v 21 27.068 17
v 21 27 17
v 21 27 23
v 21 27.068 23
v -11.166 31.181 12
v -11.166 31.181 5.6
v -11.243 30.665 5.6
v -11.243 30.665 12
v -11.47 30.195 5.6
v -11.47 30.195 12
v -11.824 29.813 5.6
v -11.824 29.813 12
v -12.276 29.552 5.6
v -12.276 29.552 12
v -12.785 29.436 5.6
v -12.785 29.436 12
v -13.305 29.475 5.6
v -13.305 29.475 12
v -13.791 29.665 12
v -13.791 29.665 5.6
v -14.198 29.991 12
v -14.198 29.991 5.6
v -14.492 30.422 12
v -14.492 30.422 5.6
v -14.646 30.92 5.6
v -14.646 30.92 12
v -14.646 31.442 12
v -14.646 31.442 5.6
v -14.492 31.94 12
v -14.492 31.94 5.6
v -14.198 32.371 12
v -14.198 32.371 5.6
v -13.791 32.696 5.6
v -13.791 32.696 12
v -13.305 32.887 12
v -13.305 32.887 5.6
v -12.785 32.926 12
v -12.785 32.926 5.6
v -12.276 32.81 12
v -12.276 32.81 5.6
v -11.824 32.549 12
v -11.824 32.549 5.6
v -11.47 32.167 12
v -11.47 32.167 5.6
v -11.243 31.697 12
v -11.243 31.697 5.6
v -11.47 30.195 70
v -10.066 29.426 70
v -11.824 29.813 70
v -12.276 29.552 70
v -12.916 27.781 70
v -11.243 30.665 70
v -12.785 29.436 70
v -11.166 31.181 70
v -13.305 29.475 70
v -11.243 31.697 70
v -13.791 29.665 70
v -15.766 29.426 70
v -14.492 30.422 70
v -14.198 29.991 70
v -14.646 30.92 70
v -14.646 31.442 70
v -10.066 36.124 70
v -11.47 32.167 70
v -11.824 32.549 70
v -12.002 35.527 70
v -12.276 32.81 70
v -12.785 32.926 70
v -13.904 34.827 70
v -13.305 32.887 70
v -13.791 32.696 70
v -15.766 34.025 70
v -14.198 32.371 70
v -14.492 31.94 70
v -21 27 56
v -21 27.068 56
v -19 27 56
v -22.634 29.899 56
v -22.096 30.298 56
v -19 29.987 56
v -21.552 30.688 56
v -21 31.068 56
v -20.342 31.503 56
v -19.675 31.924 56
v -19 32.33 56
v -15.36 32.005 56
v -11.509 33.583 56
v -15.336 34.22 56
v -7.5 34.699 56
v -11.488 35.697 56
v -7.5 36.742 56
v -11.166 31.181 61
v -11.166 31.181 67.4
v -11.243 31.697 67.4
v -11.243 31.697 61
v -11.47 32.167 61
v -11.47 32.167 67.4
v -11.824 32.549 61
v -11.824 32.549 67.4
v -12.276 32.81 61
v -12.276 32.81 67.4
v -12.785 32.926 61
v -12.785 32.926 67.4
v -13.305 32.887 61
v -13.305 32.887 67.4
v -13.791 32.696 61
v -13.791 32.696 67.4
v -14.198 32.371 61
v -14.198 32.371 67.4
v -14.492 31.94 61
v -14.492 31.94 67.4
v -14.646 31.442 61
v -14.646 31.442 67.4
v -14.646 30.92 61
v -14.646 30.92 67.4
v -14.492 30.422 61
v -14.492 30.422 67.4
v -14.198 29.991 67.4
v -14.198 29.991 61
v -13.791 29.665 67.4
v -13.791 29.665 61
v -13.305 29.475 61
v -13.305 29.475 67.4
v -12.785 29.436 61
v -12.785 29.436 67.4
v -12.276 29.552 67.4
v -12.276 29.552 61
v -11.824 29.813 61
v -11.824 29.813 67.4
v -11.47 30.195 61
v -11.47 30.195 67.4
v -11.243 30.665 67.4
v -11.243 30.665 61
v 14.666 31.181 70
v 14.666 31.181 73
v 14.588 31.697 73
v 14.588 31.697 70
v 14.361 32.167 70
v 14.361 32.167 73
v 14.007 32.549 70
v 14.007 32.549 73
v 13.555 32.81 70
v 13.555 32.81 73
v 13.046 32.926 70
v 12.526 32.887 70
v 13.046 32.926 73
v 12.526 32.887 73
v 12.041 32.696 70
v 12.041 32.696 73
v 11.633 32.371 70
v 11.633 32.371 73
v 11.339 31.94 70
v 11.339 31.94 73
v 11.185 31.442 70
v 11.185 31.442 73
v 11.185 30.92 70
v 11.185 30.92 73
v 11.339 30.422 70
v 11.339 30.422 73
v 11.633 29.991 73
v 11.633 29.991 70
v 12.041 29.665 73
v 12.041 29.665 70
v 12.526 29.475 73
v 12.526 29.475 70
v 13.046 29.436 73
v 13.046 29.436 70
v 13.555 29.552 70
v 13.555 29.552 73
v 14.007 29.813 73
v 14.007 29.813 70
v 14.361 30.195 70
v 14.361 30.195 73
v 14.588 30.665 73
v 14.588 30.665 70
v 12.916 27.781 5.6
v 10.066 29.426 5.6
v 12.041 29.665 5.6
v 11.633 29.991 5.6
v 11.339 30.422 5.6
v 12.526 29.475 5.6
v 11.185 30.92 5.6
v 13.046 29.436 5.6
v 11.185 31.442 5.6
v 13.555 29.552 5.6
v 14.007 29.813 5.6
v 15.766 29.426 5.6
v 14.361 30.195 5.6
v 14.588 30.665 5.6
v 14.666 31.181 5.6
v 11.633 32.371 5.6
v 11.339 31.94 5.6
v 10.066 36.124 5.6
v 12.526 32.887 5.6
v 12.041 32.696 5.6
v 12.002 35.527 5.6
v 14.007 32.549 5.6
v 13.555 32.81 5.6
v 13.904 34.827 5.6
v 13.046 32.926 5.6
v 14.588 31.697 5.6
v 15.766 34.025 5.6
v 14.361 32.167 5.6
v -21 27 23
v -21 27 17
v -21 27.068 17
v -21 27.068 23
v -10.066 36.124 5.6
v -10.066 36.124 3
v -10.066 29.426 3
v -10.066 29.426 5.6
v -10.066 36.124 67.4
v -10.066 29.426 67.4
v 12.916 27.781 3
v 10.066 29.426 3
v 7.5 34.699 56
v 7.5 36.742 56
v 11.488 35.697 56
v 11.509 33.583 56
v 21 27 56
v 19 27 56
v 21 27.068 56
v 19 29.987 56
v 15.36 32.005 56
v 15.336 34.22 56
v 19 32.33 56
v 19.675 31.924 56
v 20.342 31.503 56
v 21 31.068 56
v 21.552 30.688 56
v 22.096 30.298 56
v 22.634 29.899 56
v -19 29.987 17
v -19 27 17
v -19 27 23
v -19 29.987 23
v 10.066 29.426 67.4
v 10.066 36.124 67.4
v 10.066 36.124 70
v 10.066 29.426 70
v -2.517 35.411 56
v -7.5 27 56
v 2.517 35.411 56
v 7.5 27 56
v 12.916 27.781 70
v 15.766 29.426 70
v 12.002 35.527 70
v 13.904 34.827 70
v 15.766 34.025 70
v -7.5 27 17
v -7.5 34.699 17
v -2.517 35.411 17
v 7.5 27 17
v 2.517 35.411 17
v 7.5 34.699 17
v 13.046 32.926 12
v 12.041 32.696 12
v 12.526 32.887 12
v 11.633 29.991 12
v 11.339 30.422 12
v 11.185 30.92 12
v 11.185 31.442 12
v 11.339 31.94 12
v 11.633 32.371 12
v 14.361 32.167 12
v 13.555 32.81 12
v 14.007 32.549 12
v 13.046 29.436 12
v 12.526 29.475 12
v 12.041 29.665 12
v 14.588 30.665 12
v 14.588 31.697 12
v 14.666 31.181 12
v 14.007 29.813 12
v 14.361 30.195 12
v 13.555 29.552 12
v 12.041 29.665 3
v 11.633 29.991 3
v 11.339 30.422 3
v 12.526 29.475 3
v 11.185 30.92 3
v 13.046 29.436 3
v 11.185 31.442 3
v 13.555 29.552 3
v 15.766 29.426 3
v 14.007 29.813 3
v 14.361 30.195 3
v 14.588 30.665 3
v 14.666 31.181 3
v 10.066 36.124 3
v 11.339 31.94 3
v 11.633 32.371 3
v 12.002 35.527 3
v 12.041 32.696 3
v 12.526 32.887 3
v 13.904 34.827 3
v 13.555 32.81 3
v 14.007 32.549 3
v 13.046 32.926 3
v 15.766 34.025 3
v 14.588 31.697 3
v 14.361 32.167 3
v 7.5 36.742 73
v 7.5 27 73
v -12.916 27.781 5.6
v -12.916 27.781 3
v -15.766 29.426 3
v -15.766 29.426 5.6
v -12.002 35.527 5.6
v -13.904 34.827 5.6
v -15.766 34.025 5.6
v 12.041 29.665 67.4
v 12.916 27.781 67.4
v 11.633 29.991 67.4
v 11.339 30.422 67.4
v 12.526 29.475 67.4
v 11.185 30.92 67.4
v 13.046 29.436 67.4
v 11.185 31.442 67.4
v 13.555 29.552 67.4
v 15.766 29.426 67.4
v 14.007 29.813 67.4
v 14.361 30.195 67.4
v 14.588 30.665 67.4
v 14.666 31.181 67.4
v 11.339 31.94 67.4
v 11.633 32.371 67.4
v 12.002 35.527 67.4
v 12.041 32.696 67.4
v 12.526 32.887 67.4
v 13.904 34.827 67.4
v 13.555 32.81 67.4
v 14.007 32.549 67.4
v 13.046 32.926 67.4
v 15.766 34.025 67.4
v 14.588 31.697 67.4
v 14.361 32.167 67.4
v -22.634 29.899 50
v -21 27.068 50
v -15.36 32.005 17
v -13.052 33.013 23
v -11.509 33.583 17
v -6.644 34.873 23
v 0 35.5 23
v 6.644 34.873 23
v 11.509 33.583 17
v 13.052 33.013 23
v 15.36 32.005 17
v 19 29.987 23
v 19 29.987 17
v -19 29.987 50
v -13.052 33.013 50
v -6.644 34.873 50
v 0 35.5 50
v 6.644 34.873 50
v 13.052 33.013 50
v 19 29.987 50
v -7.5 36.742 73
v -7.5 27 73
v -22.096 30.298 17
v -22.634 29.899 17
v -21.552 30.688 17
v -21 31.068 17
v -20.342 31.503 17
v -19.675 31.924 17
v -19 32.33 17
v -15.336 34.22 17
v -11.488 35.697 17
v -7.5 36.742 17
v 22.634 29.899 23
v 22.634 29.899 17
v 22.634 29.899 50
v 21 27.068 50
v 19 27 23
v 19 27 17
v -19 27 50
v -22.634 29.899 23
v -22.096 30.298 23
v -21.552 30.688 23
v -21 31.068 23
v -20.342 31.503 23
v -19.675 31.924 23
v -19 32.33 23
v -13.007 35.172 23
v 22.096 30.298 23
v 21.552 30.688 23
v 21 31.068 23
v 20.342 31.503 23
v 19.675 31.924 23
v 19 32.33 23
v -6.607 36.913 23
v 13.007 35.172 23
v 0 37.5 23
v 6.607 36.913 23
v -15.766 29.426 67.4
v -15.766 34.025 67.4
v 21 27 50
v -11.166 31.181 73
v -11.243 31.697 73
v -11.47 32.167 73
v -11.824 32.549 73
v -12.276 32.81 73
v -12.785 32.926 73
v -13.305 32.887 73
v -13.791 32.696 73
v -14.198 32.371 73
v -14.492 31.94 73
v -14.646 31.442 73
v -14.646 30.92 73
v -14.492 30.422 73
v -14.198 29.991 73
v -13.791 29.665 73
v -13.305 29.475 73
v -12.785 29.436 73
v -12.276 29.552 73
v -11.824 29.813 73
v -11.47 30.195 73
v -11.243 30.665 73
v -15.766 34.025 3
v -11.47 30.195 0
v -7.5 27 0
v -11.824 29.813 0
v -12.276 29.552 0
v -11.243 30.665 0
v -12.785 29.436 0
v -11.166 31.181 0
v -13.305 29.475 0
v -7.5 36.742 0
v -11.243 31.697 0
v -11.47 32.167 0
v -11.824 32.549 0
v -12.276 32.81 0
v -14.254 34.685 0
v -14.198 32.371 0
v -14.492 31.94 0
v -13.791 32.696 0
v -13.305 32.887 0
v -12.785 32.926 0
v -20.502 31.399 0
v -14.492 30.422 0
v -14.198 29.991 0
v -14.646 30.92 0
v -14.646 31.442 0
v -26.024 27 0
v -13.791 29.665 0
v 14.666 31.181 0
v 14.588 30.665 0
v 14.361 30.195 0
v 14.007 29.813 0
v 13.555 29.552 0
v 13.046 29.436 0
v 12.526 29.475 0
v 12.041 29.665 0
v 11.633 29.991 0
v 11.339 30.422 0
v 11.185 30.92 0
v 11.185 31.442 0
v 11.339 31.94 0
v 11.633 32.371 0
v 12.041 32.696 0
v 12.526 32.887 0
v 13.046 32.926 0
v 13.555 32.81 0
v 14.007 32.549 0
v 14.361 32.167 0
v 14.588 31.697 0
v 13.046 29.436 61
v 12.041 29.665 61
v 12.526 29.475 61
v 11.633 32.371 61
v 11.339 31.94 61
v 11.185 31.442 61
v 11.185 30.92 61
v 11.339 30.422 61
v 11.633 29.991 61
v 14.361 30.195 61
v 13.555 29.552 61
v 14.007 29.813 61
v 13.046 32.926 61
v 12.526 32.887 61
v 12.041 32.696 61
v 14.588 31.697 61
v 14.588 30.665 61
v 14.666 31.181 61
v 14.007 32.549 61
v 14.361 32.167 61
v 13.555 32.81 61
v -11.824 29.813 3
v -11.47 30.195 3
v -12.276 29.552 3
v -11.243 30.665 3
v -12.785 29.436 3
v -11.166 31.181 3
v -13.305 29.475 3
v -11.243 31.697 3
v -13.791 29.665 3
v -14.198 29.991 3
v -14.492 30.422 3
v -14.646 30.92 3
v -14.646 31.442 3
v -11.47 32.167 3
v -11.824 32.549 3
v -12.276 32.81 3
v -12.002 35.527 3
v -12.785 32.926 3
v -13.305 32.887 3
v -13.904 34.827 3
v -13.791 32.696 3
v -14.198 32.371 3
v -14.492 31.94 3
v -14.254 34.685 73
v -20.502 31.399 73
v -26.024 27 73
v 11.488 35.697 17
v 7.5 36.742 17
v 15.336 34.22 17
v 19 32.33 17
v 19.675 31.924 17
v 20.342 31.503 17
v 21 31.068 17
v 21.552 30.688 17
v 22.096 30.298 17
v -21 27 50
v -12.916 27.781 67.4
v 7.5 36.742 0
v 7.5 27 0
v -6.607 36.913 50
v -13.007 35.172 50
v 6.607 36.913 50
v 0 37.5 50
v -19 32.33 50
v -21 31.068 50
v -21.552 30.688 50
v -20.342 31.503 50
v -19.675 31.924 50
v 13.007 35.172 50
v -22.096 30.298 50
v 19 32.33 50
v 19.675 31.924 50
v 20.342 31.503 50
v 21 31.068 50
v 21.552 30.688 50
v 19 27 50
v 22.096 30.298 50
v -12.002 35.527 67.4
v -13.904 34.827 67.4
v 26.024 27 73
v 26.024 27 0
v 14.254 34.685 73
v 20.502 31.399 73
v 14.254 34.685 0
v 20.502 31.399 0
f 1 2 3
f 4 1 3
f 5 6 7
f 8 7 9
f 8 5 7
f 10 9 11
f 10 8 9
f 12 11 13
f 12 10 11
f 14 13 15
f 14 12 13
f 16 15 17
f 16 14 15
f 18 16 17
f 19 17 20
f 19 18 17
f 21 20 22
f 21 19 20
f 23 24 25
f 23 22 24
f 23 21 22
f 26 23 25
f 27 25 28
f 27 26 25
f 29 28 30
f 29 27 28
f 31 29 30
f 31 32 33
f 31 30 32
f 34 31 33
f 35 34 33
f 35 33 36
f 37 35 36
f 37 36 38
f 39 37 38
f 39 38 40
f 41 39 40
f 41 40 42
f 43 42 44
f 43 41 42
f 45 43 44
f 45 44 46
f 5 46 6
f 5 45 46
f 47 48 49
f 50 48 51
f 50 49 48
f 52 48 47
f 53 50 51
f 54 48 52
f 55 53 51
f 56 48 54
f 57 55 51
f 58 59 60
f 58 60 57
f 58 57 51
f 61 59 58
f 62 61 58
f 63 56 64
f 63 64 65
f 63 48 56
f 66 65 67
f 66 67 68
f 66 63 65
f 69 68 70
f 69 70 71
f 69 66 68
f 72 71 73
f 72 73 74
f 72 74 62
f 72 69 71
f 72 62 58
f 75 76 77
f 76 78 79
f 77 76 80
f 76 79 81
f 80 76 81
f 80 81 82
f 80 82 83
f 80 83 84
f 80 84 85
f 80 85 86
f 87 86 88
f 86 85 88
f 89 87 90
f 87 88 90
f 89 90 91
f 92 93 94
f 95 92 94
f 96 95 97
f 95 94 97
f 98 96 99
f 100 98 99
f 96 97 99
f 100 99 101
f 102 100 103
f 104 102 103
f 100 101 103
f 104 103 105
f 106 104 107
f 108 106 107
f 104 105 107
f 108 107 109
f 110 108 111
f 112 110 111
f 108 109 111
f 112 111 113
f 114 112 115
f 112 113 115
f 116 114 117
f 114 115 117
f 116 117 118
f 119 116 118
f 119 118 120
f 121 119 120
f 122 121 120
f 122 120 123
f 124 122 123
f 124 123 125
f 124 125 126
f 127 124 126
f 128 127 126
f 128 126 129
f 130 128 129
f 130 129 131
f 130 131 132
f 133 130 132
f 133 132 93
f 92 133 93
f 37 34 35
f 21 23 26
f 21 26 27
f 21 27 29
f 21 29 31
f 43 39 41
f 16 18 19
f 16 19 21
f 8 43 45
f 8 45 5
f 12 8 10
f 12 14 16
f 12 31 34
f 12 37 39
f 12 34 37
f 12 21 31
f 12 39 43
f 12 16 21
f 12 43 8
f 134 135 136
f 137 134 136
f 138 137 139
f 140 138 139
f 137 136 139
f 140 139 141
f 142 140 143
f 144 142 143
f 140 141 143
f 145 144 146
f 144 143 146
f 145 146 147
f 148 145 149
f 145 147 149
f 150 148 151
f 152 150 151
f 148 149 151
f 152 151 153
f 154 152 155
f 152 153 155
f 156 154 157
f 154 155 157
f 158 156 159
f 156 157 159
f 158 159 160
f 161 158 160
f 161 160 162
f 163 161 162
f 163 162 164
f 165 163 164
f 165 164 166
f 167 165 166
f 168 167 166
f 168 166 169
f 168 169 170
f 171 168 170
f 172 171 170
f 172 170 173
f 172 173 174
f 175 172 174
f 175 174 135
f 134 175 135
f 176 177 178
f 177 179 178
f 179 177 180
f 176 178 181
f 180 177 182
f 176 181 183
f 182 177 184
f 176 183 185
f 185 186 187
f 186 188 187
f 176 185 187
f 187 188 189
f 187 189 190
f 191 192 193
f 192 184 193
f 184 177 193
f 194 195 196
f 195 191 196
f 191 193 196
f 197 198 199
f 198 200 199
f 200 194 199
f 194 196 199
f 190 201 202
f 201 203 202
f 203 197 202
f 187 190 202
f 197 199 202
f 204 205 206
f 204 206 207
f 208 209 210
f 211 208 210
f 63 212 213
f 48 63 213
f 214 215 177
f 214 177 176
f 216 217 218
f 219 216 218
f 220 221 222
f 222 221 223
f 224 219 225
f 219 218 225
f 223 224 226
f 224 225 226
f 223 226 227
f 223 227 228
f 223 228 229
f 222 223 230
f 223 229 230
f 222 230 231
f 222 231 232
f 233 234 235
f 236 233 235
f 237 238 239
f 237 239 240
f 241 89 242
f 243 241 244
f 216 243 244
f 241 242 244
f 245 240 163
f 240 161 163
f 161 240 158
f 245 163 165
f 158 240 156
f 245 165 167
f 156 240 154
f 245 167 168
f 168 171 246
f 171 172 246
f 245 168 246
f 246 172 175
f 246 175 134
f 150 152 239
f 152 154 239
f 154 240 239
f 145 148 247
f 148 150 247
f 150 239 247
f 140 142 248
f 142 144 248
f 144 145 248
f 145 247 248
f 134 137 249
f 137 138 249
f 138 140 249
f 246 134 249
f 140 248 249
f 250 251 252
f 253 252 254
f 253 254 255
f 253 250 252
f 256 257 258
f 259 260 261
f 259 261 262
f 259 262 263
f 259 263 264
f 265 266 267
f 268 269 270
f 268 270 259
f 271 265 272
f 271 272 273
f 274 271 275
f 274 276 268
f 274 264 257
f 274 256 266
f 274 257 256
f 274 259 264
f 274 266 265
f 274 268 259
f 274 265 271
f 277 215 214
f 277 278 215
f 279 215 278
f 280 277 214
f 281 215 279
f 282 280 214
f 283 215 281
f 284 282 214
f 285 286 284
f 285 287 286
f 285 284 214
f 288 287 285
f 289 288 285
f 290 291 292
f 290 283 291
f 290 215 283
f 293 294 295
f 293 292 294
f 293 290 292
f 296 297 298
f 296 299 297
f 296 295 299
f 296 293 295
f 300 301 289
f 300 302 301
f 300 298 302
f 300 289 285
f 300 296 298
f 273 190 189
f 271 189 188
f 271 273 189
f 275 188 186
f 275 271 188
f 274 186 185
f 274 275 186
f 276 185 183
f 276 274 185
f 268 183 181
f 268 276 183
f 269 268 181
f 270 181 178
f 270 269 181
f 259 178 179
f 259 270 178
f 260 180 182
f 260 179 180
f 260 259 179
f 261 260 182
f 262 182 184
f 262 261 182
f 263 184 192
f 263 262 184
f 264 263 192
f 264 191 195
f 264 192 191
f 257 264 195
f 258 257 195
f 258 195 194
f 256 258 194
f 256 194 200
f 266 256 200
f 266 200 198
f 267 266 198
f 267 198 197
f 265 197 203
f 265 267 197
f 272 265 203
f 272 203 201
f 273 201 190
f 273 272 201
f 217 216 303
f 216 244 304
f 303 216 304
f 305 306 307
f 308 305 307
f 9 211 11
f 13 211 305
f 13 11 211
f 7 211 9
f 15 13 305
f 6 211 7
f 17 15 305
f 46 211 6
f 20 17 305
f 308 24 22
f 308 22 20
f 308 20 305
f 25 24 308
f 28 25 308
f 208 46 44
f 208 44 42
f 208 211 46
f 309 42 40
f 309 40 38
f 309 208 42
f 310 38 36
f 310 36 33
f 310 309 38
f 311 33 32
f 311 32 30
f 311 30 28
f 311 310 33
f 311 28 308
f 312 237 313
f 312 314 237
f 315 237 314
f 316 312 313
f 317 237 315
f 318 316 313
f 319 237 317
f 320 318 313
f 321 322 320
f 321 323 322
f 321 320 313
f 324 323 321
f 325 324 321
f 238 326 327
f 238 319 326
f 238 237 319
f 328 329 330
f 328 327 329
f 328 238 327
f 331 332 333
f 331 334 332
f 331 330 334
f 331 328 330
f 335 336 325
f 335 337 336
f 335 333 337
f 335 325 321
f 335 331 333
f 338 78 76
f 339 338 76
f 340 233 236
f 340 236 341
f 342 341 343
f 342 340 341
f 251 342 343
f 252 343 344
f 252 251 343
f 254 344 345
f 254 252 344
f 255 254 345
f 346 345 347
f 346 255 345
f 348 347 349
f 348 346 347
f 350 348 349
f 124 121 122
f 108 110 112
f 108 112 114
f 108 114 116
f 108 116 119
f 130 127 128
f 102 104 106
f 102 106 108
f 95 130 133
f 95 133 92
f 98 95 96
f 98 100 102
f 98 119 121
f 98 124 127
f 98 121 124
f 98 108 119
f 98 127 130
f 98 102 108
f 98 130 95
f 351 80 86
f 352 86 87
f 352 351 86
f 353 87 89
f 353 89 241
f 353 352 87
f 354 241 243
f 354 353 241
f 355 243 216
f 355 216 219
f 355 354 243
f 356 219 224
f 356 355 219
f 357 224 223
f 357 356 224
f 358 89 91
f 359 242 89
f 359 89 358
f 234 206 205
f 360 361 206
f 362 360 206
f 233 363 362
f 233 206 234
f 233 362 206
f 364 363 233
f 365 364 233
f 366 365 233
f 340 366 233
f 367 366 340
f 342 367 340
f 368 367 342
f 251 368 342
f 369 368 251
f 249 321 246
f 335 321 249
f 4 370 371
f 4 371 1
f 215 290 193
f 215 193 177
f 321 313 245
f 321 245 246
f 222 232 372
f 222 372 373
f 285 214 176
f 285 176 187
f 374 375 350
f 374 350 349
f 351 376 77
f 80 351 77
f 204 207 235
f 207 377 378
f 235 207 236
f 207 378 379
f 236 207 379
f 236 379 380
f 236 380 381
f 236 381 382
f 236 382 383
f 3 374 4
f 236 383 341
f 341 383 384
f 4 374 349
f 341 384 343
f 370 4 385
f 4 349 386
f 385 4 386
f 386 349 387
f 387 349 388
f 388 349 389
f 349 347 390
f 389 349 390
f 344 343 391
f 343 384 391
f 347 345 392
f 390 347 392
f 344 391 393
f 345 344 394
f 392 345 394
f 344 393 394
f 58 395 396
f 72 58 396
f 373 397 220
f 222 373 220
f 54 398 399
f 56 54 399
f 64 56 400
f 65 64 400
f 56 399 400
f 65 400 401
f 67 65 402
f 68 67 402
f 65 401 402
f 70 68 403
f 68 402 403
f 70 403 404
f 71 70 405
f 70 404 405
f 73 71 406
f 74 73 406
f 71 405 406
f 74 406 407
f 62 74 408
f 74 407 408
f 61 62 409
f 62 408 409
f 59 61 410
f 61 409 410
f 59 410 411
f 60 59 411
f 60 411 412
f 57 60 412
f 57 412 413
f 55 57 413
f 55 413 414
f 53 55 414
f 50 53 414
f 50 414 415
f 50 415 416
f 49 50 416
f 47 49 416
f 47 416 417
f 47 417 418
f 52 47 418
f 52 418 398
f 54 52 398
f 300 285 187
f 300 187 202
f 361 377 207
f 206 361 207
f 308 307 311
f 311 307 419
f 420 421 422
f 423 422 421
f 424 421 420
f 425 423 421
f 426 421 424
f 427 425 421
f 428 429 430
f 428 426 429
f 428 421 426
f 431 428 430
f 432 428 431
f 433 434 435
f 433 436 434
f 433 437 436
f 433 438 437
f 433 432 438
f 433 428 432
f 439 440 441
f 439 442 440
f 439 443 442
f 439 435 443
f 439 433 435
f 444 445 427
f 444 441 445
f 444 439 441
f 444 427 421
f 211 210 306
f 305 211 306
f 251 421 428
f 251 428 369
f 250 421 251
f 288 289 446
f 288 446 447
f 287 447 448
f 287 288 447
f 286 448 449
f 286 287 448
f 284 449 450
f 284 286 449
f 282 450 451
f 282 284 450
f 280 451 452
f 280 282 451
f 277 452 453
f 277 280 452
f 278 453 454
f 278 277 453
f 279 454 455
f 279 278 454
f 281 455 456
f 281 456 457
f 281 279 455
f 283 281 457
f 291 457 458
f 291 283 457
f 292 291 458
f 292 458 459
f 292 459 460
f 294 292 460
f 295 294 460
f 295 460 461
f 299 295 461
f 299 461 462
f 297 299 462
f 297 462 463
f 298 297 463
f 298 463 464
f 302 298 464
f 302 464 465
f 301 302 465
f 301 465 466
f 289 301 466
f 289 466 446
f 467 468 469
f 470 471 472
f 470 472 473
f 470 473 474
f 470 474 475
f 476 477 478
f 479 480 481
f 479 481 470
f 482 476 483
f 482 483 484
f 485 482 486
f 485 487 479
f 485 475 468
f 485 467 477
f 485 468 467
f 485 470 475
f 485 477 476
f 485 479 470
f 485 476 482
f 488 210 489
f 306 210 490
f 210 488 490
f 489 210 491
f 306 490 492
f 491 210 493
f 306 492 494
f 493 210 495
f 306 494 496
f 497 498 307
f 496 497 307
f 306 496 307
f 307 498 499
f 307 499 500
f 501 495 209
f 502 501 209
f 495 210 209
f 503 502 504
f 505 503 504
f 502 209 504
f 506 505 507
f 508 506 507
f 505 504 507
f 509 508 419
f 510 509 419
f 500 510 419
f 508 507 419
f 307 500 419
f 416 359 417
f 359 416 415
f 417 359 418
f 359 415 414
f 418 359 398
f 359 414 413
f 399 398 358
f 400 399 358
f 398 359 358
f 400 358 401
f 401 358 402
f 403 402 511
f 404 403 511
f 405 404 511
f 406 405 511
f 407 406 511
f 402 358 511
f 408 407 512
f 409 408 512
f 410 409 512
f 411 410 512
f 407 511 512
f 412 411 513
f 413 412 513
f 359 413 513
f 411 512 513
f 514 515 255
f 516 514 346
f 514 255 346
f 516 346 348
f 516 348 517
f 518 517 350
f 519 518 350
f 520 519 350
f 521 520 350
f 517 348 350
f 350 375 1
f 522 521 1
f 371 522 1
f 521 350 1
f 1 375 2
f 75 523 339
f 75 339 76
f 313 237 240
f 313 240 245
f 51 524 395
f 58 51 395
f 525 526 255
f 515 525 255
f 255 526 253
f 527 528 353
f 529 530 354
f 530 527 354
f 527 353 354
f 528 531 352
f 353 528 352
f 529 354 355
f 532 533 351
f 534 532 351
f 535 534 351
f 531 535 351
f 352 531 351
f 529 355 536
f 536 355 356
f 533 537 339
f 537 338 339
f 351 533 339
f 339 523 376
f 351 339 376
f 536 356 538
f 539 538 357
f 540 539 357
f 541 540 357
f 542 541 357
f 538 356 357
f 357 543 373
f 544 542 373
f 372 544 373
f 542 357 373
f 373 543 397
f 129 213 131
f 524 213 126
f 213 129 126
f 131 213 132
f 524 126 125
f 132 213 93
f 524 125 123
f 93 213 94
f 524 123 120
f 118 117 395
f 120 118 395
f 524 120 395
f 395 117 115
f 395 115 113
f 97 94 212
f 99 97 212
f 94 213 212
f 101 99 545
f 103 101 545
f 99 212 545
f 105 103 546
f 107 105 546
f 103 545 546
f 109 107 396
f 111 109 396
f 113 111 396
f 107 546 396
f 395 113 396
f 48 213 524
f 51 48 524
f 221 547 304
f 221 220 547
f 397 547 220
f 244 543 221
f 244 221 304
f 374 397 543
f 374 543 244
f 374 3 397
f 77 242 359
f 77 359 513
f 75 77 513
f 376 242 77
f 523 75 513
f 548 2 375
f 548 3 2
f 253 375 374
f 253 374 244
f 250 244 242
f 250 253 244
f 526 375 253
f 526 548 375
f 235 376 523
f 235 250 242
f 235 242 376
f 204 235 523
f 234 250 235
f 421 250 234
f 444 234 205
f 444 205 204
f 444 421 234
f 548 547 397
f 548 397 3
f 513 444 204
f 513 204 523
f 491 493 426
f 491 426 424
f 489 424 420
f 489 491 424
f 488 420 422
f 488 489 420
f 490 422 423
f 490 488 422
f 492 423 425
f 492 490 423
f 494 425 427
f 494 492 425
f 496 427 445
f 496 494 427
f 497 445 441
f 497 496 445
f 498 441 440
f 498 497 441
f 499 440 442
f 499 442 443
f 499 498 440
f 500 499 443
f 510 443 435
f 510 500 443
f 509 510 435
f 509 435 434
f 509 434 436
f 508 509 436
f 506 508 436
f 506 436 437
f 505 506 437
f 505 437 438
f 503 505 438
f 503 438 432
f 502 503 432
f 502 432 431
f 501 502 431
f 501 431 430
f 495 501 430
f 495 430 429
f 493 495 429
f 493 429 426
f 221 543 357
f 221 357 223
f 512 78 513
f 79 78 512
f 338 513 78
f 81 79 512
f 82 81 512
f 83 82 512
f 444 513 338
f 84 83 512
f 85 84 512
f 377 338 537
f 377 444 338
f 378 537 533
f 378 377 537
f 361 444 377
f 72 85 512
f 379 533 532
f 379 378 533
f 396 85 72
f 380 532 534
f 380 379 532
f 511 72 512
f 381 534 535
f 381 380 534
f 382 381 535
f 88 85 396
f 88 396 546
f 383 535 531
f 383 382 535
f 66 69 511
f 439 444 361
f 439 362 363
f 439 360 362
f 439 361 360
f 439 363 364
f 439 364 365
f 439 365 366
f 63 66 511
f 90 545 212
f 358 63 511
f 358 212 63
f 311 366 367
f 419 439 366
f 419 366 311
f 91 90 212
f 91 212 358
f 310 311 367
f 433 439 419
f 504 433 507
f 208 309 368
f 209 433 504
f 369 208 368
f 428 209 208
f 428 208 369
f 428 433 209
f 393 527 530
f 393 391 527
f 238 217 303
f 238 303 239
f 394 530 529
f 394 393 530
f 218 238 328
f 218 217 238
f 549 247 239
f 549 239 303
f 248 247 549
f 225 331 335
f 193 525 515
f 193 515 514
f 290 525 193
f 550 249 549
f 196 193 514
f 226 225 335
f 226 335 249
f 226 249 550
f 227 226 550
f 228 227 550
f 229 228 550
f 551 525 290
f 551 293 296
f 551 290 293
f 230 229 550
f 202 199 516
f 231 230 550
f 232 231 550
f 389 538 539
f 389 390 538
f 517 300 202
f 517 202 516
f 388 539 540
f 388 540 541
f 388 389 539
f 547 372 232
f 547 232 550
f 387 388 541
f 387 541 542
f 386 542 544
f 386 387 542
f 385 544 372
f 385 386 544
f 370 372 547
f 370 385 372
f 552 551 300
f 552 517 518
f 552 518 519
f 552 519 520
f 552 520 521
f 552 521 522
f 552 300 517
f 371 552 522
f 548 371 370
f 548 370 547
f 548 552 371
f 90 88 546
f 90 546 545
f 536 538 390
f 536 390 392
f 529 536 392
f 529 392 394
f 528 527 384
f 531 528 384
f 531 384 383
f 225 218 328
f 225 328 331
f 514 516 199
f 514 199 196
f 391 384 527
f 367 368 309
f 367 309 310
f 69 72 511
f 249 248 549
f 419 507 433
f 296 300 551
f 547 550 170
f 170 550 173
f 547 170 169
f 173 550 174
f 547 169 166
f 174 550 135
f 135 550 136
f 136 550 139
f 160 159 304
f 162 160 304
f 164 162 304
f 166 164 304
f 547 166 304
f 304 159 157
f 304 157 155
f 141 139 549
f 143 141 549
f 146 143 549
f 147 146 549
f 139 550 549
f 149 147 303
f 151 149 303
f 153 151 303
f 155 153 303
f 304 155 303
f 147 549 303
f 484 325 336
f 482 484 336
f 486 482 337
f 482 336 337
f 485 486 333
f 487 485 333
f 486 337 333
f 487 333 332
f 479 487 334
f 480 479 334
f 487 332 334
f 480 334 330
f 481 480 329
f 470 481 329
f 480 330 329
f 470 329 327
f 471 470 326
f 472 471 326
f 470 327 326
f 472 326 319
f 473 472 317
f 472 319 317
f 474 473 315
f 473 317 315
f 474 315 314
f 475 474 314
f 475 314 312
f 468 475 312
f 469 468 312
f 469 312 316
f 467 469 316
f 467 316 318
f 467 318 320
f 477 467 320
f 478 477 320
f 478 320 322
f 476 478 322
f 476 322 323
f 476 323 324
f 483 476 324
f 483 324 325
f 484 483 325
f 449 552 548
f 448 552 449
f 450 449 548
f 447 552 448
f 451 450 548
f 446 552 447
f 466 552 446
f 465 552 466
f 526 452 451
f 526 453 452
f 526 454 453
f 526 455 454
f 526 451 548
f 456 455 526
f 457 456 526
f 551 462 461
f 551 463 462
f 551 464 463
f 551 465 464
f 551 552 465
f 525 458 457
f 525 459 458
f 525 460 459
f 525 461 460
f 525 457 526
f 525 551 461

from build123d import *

# Parameters (mm, degrees)
BOSS_EXTRU_2_DEPTH       = 73
ESQUISSE7_R              = 1.75
ENL_V_MAT_EXTRU_4_DEPTH  = 12
ENL_V_START              = -5.6
ENL_V_MAT_EXTRU_5_DEPTH  = 2.6
ENL_V_START_2            = -12
ESQUISSE12_R             = 1.75
ENL_V_MAT_EXTRU_6_DEPTH  = 12
ENL_V_START_3            = -3
ENL_V_MAT_EXTRU_7_DEPTH  = 2.6
ESQUISSE21_W             = 15
ESQUISSE21_H             = 17
ENL_V_MAT_EXTRU_14_DEPTH = 79.208055851
ESQUISSE22_W             = 2
ESQUISSE22_H             = 6
ENL_V_MAT_EXTRU_15_DEPTH = 79.208055851
ENL_V_START_4            = -17
ENL_V_MAT_EXTRU_17_DEPTH = 6
ENL_V_START_5            = -23
ENL_V_MAT_EXTRU_19_DEPTH = 6
CHANFREIN1_SIZE          = 4
CHANFREIN2_SIZE          = 4


with BuildPart() as part:
    # Esquisse3 → Boss.-Extru.2 (new body)
    with BuildSketch(Plane.XY):
        with BuildLine():
            ThreePointArc((-26.024027359, 27), (0, 37.5), (26.024027359, 27))
            Line((26.024027359, 27), (13.076696831, 27))
            Line((13.076696831, 27), (-13.076696831, 27))
            Line((-13.076696831, 27), (-26.024027359, 27))
        make_face()
    extrude(amount=BOSS_EXTRU_2_DEPTH)

    # Esquisse7 → Enlèv. mat.-Extru.4 (cut)
    with BuildSketch(Plane.XY.offset(73)):
        with Locations((-12.915565842, 31.180934222)):
            Circle(ESQUISSE7_R)
        with Locations((12.915565842, 31.180934222)):
            Circle(ESQUISSE7_R)
    extrude(amount=-ENL_V_MAT_EXTRU_4_DEPTH, mode=Mode.SUBTRACT)

    # Esquisse11 → Enlèv. mat.-Extru.5 (cut)
    with BuildSketch(Plane.XY.offset(73).offset(ENL_V_START)):
        with BuildLine():
            Line((-15.765565842, 31.180934222), (-15.765565842, 34.024945756))
            ThreePointArc((-15.765565842, 34.024945756), (-12.95813326, 35.190009696), (-10.065565842, 36.123875543))
            Line((-10.065565842, 36.123875543), (-10.065565842, 29.426382489))
            Line((-10.065565842, 29.426382489), (-12.915565842, 27.780934222))
            Line((-12.915565842, 27.780934222), (-15.765565842, 29.426382489))
            Line((-15.765565842, 29.426382489), (-15.765565842, 31.180934222))
        make_face()
        with BuildLine():
            Line((10.065565842, 36.123875543), (10.065565842, 29.426382489))
            Line((10.065565842, 29.426382489), (12.915565842, 27.780934222))
            Line((12.915565842, 27.780934222), (15.765565842, 29.426382489))
            Line((15.765565842, 29.426382489), (15.765565842, 34.024945756))
            ThreePointArc((15.765565842, 34.024945756), (12.95813326, 35.190009696), (10.065565842, 36.123875543))
        make_face()
    extrude(amount=ENL_V_MAT_EXTRU_5_DEPTH, mode=Mode.SUBTRACT)

    # Esquisse12 → Enlèv. mat.-Extru.6 (cut)
    with BuildSketch(Plane(origin=(0, 0, 0), x_dir=(-1, 0, 0), z_dir=(0, 0, -1)).offset(ENL_V_START_2)):
        with Locations(Location((-12.915565842, 31.180934222, 0), (0, 0, 180))):
            Circle(ESQUISSE12_R)
        with Locations(Location((12.915565842, 31.180934222, 0), (0, 0, 180))):
            Circle(ESQUISSE12_R)
    extrude(amount=ENL_V_MAT_EXTRU_6_DEPTH, mode=Mode.SUBTRACT)

    # Esquisse14 → Enlèv. mat.-Extru.7 (cut)
    with BuildSketch(Plane(origin=(0, 0, 0), x_dir=(-1, 0, 0), z_dir=(0, 0, -1)).offset(ENL_V_START_3)):
        with BuildLine():
            Line((-15.765565842, 31.689067965), (-15.765565842, 34.024945756))
            ThreePointArc((-15.765565842, 34.024945756), (-12.95813326, 35.190009696), (-10.065565842, 36.123875543))
            Line((-10.065565842, 36.123875543), (-10.065565842, 29.426382489))
            Line((-10.065565842, 29.426382489), (-12.915565842, 27.780934222))
            Line((-12.915565842, 27.780934222), (-15.765565842, 29.426382489))
            Line((-15.765565842, 29.426382489), (-15.765565842, 31.689067965))
        make_face()
        with BuildLine():
            Line((10.065565842, 36.123875543), (10.065565842, 29.426382489))
            Line((10.065565842, 29.426382489), (12.915565842, 27.780934222))
            Line((12.915565842, 27.780934222), (15.765565842, 29.426382489))
            Line((15.765565842, 29.426382489), (15.765565842, 34.024945756))
            ThreePointArc((15.765565842, 34.024945756), (12.95813326, 35.190009696), (10.065565842, 36.123875543))
        make_face()
    extrude(amount=-ENL_V_MAT_EXTRU_7_DEPTH, mode=Mode.SUBTRACT)

    # Esquisse21 → Enlèv. mat.-Extru.14 (cut, through all)
    with BuildSketch(Plane.XZ.offset(-27)):
        with Locations((0, 64.5)):
            Rectangle(ESQUISSE21_W, ESQUISSE21_H)
        with Locations((0, 8.5)):
            Rectangle(ESQUISSE21_W, ESQUISSE21_H)
    extrude(amount=-ENL_V_MAT_EXTRU_14_DEPTH, mode=Mode.SUBTRACT)

    # Esquisse22 → Enlèv. mat.-Extru.15 (cut, through all)
    with BuildSketch(Plane.XZ.offset(-27)):
        with Locations((-20, 53)):
            Rectangle(ESQUISSE22_W, ESQUISSE22_H)
        with Locations((20, 53)):
            Rectangle(ESQUISSE22_W, ESQUISSE22_H)
        with Locations((-20, 20)):
            Rectangle(ESQUISSE22_W, ESQUISSE22_H)
        with Locations((20, 20)):
            Rectangle(ESQUISSE22_W, ESQUISSE22_H)
    extrude(amount=-ENL_V_MAT_EXTRU_15_DEPTH, mode=Mode.SUBTRACT)

    # Esquisse23 → Enlèv. mat.-Extru.17 (cut)
    with BuildSketch(Plane(origin=(0, 0, 0), x_dir=(-1, 0, 0), z_dir=(0, 0, -1)).offset(ENL_V_START_4)):
        with BuildLine():
            Line((-19, 29.987497395), (-19, 32.330326321))
            ThreePointArc((-19, 32.330326321), (0, 37.5), (19, 32.330326321))
            Line((19, 32.330326321), (19, 29.987497395))
            ThreePointArc((19, 29.987497395), (0, 35.5), (-19, 29.987497395))
        make_face()
    extrude(amount=-ENL_V_MAT_EXTRU_17_DEPTH, mode=Mode.SUBTRACT)

    # Esquisse27 → Enlèv. mat.-Extru.19 (cut)
    with BuildSketch(Plane.XY.offset(73).offset(ENL_V_START_5)):
        with BuildLine():
            Line((-19, 32.330326321), (-19, 29.987497395))
            ThreePointArc((-19, 29.987497395), (0, 35.5), (19, 29.987497395))
            Line((19, 29.987497395), (19, 32.330326321))
            ThreePointArc((19, 32.330326321), (0, 37.5), (-19, 32.330326321))
        make_face()
    extrude(amount=ENL_V_MAT_EXTRU_19_DEPTH, mode=Mode.SUBTRACT)

    # Chanfrein1
    # the kernel refuses this chamfer: 4, 2.005021286 mm, written as the material it takes off along each edge
    with BuildSketch(Plane(origin=(21, 31.068472766, 56), x_dir=(0.8131904360311143, -0.581997693077495, 0), z_dir=(0, 0, -1)), Plane(origin=(21, 31.068472766, 23), x_dir=(0.8131904360311155, -0.5819976930774934, 0), z_dir=(0, 0, -1))) as chanfrein1_piece_1:
        with BuildLine():
            Line((2.009560641, 0), (CHANFREIN1_SIZE * 0.581997693077, CHANFREIN1_SIZE * 0.813190436031))
            Line((CHANFREIN1_SIZE * 0.581997693077, CHANFREIN1_SIZE * 0.813190436031), (0, 0))
            ThreePointArc((0, 0), (0.996999681, -0.013462723), (2.009560641, 0))
        make_face()
    extrude(amount=6, mode=Mode.SUBTRACT)

    # Chanfrein2
    # the kernel refuses this chamfer: 4, 2.005021286 mm, written as the material it takes off along each edge
    with BuildSketch(Plane(origin=(-21, 31.068472766, 23), x_dir=(-0.8131904360311136, -0.5819976930774963, 0), z_dir=(0, 0, -1)), Plane(origin=(-21, 31.068472766, 56), x_dir=(-0.8131904360311129, -0.581997693077497, 0), z_dir=(0, 0, -1))) as chanfrein2_piece_1:
        with BuildLine():
            Line((2.009560641, 0), (CHANFREIN2_SIZE * 0.581997693077, -CHANFREIN2_SIZE * 0.813190436031))
            Line((CHANFREIN2_SIZE * 0.581997693077, -CHANFREIN2_SIZE * 0.813190436031), (0, 0))
            ThreePointArc((0, 0), (0.996999681, 0.013462723), (2.009560641, 0))
        make_face()
    extrude(amount=6, mode=Mode.SUBTRACT)


solid = part.part
